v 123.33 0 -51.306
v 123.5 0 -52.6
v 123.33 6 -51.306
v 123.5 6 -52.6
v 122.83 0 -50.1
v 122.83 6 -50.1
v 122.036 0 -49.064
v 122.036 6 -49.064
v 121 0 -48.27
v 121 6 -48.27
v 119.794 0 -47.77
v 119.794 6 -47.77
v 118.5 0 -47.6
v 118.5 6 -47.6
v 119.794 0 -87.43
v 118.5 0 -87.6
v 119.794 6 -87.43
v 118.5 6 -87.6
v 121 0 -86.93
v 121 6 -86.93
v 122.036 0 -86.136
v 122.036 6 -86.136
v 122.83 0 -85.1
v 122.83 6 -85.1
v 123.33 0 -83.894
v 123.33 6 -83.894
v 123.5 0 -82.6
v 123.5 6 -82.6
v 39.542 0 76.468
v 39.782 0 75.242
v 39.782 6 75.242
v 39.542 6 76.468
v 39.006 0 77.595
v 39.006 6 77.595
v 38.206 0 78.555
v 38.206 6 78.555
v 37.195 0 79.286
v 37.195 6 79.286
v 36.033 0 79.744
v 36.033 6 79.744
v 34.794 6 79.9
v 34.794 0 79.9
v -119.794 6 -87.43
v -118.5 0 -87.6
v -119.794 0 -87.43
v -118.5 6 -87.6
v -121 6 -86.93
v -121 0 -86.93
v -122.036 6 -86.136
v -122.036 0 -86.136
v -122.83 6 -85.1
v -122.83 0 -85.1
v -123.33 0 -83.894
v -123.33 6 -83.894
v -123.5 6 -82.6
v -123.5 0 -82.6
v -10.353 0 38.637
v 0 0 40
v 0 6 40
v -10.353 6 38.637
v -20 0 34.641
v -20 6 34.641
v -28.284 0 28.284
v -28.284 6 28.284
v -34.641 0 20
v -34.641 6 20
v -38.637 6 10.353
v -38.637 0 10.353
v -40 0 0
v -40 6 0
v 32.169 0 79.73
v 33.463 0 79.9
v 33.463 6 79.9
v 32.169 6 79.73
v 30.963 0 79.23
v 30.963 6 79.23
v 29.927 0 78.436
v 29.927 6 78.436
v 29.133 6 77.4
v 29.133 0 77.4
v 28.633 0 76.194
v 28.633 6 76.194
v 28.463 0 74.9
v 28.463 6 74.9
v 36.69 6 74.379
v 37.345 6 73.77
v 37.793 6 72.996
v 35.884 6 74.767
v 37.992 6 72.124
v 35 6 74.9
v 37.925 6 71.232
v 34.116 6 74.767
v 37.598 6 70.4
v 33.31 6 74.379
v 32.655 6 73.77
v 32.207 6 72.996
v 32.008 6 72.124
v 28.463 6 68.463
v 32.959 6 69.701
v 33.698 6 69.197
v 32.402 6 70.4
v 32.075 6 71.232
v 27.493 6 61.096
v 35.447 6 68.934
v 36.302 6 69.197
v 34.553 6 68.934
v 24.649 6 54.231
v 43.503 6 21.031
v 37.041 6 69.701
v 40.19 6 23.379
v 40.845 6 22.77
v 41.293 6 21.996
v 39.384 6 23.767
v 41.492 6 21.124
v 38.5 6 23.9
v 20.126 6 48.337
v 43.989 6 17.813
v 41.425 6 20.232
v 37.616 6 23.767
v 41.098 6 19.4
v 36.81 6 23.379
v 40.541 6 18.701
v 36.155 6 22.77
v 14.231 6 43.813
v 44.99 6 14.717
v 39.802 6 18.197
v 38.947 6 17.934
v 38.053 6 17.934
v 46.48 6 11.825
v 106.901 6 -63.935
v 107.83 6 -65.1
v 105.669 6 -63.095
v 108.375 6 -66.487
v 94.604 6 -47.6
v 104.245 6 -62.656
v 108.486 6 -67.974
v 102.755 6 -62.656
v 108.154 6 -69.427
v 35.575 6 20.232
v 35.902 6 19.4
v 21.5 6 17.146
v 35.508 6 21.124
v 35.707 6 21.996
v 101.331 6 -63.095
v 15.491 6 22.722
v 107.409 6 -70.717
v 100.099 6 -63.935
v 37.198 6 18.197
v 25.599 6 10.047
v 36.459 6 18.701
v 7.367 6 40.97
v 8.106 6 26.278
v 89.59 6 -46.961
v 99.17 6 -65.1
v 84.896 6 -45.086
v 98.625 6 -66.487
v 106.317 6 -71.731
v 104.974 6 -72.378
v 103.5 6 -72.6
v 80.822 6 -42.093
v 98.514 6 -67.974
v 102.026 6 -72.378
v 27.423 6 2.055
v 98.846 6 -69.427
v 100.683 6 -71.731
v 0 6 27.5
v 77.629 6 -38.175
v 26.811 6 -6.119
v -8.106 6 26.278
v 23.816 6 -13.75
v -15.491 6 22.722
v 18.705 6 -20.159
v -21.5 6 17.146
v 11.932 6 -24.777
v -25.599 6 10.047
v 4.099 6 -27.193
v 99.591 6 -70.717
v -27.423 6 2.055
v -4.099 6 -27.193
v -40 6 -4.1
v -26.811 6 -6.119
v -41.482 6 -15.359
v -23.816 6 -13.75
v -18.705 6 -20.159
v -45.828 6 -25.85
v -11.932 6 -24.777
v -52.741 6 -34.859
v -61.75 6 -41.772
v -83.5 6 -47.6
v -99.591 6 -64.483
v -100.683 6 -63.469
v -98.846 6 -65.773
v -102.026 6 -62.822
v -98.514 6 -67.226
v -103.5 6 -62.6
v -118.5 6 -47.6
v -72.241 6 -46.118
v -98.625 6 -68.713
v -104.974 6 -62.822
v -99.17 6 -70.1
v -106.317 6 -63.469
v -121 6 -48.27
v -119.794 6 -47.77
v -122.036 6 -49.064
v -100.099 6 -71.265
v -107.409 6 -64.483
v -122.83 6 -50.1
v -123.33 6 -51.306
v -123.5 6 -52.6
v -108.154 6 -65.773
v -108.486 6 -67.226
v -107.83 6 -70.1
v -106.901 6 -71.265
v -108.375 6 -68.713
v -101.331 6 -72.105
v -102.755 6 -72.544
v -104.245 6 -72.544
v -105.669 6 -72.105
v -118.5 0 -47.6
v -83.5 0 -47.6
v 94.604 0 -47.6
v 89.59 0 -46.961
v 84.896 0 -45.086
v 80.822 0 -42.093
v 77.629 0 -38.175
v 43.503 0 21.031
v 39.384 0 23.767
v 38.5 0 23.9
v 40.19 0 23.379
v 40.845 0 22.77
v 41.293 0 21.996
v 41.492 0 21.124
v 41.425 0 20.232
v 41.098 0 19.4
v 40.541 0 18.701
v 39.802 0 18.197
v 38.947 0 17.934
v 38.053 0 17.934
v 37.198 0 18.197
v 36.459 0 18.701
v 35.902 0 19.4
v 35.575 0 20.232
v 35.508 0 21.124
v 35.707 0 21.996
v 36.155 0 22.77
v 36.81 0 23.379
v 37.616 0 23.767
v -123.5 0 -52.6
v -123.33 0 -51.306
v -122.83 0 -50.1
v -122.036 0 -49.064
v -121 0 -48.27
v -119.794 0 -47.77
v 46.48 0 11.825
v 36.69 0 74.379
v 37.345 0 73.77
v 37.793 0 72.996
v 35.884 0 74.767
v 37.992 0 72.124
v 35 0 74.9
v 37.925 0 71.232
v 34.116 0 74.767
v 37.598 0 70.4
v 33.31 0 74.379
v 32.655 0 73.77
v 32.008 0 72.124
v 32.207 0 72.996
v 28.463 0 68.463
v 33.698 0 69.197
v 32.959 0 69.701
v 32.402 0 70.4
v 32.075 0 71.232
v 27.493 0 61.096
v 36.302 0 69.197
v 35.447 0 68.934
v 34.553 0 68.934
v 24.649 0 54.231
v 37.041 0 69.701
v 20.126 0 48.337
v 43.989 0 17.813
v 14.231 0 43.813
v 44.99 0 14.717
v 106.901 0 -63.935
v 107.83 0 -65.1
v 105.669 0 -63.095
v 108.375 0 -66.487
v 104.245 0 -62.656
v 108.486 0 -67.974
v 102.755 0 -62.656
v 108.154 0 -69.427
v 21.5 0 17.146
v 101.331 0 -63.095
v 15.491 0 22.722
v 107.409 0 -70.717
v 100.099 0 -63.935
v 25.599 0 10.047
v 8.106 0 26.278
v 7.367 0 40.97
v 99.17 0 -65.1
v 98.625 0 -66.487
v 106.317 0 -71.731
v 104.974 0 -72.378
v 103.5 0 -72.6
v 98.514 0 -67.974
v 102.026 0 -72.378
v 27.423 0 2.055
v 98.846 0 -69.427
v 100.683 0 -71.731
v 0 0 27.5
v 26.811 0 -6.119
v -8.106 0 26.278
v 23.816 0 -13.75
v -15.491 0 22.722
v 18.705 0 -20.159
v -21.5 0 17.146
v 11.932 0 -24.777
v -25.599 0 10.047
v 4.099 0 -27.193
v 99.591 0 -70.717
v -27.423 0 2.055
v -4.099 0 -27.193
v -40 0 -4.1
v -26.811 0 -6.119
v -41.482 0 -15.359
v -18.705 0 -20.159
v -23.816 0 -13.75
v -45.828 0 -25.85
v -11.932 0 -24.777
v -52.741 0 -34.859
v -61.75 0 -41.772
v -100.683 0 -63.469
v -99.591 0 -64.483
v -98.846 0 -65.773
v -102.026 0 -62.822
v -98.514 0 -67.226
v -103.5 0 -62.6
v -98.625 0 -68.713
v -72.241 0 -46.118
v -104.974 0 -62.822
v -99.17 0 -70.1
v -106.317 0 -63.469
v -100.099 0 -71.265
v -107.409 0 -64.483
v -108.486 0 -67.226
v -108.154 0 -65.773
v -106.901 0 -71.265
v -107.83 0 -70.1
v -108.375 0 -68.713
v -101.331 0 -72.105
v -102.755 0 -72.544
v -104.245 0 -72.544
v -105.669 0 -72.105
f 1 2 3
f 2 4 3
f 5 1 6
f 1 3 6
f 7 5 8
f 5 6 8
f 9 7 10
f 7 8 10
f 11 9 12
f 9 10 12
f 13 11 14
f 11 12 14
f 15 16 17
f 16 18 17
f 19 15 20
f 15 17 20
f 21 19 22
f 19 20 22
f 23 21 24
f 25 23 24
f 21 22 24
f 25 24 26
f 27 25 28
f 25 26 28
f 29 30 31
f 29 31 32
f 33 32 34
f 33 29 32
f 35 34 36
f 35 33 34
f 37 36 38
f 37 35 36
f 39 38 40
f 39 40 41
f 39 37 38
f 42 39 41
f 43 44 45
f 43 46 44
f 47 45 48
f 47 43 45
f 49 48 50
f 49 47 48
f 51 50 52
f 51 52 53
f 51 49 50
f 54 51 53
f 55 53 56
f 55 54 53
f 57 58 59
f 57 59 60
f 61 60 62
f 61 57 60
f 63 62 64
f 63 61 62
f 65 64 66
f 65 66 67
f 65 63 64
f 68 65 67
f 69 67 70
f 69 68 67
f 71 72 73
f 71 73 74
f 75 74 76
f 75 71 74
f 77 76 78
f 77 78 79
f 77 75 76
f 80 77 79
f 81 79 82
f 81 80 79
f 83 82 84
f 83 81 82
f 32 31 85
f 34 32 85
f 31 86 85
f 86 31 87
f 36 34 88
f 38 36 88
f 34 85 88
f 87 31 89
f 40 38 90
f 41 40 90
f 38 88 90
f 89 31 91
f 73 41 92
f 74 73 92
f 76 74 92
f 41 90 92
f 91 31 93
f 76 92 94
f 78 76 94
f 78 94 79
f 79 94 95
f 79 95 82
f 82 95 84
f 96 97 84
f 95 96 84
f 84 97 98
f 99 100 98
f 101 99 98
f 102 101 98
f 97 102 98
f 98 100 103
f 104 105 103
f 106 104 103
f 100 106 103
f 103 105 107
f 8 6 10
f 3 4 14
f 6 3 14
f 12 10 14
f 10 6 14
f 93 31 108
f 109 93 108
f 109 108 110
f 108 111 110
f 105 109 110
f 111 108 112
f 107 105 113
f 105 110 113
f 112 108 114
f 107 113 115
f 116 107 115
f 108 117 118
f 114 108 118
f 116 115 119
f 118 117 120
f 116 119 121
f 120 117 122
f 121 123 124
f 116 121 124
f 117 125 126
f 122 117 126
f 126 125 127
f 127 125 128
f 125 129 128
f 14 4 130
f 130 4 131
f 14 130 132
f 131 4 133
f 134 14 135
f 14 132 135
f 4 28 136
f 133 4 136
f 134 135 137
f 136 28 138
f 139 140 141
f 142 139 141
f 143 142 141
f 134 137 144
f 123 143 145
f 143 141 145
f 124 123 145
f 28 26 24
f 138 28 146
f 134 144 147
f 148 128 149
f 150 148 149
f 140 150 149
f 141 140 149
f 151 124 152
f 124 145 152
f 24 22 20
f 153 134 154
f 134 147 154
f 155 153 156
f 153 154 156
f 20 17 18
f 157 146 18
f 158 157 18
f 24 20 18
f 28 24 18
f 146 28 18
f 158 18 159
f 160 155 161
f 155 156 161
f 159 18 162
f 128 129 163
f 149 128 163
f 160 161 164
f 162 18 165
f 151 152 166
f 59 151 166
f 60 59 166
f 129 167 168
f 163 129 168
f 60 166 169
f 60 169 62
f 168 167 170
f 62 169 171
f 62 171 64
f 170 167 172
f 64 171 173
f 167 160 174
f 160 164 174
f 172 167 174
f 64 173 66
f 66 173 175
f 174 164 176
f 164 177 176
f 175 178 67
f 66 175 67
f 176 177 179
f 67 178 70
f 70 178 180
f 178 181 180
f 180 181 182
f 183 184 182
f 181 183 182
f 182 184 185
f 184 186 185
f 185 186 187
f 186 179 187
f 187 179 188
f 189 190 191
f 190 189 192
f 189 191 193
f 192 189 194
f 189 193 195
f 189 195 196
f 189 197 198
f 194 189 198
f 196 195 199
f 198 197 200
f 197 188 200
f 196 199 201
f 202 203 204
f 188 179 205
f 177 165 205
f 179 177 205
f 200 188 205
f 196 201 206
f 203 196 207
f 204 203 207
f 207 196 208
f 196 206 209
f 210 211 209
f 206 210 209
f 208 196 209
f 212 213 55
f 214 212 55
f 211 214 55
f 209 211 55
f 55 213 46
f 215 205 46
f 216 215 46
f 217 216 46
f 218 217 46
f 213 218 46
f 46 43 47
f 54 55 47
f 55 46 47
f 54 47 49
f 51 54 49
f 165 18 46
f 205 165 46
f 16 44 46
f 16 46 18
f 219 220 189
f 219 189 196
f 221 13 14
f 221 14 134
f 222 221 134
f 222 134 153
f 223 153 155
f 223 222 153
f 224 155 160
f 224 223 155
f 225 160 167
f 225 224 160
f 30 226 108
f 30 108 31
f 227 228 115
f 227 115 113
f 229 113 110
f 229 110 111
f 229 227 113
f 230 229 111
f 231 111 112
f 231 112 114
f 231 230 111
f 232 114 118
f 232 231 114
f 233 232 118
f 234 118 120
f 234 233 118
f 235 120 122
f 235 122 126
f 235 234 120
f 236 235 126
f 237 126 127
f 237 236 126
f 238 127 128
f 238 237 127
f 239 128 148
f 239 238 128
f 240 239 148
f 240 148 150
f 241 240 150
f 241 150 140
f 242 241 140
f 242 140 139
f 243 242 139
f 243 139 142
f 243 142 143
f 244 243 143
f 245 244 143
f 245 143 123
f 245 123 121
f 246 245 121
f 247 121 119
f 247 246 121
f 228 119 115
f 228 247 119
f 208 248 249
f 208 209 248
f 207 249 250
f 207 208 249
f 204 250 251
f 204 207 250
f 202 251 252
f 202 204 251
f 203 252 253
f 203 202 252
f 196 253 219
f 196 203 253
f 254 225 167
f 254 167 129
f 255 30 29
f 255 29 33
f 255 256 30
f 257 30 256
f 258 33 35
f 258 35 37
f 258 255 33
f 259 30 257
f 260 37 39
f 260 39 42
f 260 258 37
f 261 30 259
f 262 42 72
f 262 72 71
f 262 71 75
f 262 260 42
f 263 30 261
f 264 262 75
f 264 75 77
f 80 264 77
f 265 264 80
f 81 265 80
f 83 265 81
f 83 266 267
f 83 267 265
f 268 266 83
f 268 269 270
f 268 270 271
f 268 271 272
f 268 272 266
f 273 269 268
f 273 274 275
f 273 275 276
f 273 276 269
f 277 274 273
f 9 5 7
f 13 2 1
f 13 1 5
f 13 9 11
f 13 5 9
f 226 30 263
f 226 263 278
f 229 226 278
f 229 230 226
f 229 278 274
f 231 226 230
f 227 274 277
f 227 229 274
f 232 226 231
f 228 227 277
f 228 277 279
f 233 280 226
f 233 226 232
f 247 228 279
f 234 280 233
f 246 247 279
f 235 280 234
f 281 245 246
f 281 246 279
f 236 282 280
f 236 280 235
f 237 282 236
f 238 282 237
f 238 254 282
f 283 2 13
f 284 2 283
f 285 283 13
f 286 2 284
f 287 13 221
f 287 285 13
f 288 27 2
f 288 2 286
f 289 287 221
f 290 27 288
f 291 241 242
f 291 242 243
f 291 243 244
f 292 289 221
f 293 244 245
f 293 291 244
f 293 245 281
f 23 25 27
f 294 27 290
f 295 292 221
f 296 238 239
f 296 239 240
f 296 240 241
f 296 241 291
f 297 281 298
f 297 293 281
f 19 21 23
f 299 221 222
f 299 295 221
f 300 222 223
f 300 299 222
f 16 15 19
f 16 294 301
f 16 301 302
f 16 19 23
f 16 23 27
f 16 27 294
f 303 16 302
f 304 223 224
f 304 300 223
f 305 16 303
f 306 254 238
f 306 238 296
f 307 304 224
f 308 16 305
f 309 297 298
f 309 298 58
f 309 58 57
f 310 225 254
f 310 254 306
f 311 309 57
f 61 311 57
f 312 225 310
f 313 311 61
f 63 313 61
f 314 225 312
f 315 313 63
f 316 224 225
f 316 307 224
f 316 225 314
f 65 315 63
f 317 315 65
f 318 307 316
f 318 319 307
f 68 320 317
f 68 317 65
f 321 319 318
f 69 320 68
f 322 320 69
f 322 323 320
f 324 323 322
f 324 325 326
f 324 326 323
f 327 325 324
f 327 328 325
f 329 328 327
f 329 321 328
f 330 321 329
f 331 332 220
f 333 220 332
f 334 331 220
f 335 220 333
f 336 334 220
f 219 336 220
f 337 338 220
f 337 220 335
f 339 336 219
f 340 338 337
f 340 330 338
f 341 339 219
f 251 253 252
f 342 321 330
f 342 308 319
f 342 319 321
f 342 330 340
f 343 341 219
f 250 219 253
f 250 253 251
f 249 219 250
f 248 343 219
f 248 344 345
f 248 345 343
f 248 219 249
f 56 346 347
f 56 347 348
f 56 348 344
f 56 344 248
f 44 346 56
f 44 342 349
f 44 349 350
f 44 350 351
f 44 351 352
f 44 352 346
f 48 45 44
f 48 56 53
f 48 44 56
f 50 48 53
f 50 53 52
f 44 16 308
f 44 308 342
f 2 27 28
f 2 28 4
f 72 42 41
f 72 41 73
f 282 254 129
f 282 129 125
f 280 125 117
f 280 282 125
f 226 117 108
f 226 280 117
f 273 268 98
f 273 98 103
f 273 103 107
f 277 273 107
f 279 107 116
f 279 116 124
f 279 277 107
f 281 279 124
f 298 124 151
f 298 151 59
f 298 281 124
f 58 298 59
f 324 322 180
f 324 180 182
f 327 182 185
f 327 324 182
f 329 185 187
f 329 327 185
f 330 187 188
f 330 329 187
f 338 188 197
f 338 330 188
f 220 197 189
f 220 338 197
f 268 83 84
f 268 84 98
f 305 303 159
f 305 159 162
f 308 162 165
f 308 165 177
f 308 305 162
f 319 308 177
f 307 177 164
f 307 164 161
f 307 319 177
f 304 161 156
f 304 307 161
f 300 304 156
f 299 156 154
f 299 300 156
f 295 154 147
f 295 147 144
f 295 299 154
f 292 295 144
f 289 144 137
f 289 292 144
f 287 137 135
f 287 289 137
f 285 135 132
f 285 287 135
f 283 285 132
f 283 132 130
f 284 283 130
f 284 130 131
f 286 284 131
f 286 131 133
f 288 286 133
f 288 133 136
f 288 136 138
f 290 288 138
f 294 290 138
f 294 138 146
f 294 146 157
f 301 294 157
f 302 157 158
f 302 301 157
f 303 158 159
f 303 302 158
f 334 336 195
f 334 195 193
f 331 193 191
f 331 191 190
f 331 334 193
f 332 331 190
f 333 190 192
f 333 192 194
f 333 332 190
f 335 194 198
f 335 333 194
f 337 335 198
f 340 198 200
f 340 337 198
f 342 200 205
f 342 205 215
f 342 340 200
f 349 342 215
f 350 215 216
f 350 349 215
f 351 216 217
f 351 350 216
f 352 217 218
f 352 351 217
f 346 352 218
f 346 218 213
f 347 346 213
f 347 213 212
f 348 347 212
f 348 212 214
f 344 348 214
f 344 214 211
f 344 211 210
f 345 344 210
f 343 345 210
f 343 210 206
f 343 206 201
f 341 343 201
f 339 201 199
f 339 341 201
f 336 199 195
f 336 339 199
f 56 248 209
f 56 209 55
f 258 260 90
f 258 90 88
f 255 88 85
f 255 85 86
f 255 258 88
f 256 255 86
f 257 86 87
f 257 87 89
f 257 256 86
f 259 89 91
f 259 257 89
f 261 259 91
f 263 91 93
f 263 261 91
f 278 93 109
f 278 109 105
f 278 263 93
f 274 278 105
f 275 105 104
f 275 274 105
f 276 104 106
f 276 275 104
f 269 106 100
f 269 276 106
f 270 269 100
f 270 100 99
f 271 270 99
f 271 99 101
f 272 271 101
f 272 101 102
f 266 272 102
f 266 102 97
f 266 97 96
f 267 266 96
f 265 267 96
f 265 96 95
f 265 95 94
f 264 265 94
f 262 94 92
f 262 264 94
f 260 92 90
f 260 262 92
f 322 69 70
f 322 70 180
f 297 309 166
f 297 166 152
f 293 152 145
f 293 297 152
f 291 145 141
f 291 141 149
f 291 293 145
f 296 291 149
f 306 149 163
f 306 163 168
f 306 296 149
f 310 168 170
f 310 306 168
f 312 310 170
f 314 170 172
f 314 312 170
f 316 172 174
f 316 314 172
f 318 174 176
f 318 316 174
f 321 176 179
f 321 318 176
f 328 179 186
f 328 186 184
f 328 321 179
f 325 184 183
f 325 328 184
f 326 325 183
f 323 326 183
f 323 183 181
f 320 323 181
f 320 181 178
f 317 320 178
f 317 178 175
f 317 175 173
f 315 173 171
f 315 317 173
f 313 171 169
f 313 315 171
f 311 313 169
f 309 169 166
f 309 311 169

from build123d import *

# Parameters (mm, degrees)
SKETCH1_R           = 27.5
SKETCH1_R_2         = 3
SKETCH1_R_3         = 5
BOSS_EXTRUDE1_DEPTH = 6
FILLET1_R           = 5


with BuildPart() as part:
    # Sketch1 → Boss-Extrude1 (new body)
    with BuildSketch(Plane(origin=(0, 0, 0), x_dir=(1, 0, 0), z_dir=(0, 1, 0))):
        with BuildLine():
            Line((-123.5, 87.6), (123.5, 87.6))
            Line((123.5, 87.6), (123.5, 47.6))
            Line((123.5, 47.6), (94.604107801, 47.6))
            ThreePointArc((94.604107801, 47.6), (84.895928348, 45.085744243), (77.628633504, 38.175125172))
            Line((77.628633504, 38.175125172), (46.48038696, -11.824874828))
            ThreePointArc((46.48038696, -11.824874828), (44.426515721, -16.245001343), (43.502792816, -21.030671774))
            Line((43.502792816, -21.030671774), (39.782384757, -75.242332057))
            ThreePointArc((39.782384757, -75.242332057), (38.206473118, -78.554562921), (34.794117647, -79.9))
            Line((34.794117647, -79.9), (33.462740879, -79.9))
            ThreePointArc((33.462740879, -79.9), (29.927206973, -78.435533906), (28.462740879, -74.9))
            Line((28.462740879, -74.9), (28.462740879, -68.462740879))
            ThreePointArc((28.462740879, -68.462740879), (20.126197087, -48.336543792), (0, -40))
            ThreePointArc((0, -40), (-28.284271247, -28.284271247), (-40, 0))
            Line((-40, 0), (-40, 4.1))
            ThreePointArc((-40, 4.1), (-52.740855018, 34.859144982), (-83.5, 47.6))
            Line((-83.5, 47.6), (-123.5, 47.6))
            Line((-123.5, 47.6), (-123.5, 87.6))
        make_face()
        with Locations(Location((0, 0, 0), (0, 0, 270))):
            Circle(SKETCH1_R, mode=Mode.SUBTRACT)
        with Locations(Location((38.5, -20.9, 0), (0, 0, 270))):
            Circle(SKETCH1_R_2, mode=Mode.SUBTRACT)
        with Locations(Location((35, -71.9, 0), (0, 0, 270))):
            Circle(SKETCH1_R_2, mode=Mode.SUBTRACT)
        with Locations(Location((-103.5, 67.6, 0), (0, 0, 270))):
            Circle(SKETCH1_R_3, mode=Mode.SUBTRACT)
        with Locations(Location((103.5, 67.6, 0), (0, 0, 90))):
            Circle(SKETCH1_R_3, mode=Mode.SUBTRACT)
    extrude(amount=BOSS_EXTRUDE1_DEPTH)

    # Fillet1
    fillet1_edges = [part.edges().sort_by_distance(p)[0] for p in [
        (-123.5, 3, -87.6),
        (123.5, 3, -87.6),
        (123.5, 3, -47.6),
        (-123.5, 3, -47.6),
    ]]
    fillet(fillet1_edges, radius=FILLET1_R)


solid = part.part
